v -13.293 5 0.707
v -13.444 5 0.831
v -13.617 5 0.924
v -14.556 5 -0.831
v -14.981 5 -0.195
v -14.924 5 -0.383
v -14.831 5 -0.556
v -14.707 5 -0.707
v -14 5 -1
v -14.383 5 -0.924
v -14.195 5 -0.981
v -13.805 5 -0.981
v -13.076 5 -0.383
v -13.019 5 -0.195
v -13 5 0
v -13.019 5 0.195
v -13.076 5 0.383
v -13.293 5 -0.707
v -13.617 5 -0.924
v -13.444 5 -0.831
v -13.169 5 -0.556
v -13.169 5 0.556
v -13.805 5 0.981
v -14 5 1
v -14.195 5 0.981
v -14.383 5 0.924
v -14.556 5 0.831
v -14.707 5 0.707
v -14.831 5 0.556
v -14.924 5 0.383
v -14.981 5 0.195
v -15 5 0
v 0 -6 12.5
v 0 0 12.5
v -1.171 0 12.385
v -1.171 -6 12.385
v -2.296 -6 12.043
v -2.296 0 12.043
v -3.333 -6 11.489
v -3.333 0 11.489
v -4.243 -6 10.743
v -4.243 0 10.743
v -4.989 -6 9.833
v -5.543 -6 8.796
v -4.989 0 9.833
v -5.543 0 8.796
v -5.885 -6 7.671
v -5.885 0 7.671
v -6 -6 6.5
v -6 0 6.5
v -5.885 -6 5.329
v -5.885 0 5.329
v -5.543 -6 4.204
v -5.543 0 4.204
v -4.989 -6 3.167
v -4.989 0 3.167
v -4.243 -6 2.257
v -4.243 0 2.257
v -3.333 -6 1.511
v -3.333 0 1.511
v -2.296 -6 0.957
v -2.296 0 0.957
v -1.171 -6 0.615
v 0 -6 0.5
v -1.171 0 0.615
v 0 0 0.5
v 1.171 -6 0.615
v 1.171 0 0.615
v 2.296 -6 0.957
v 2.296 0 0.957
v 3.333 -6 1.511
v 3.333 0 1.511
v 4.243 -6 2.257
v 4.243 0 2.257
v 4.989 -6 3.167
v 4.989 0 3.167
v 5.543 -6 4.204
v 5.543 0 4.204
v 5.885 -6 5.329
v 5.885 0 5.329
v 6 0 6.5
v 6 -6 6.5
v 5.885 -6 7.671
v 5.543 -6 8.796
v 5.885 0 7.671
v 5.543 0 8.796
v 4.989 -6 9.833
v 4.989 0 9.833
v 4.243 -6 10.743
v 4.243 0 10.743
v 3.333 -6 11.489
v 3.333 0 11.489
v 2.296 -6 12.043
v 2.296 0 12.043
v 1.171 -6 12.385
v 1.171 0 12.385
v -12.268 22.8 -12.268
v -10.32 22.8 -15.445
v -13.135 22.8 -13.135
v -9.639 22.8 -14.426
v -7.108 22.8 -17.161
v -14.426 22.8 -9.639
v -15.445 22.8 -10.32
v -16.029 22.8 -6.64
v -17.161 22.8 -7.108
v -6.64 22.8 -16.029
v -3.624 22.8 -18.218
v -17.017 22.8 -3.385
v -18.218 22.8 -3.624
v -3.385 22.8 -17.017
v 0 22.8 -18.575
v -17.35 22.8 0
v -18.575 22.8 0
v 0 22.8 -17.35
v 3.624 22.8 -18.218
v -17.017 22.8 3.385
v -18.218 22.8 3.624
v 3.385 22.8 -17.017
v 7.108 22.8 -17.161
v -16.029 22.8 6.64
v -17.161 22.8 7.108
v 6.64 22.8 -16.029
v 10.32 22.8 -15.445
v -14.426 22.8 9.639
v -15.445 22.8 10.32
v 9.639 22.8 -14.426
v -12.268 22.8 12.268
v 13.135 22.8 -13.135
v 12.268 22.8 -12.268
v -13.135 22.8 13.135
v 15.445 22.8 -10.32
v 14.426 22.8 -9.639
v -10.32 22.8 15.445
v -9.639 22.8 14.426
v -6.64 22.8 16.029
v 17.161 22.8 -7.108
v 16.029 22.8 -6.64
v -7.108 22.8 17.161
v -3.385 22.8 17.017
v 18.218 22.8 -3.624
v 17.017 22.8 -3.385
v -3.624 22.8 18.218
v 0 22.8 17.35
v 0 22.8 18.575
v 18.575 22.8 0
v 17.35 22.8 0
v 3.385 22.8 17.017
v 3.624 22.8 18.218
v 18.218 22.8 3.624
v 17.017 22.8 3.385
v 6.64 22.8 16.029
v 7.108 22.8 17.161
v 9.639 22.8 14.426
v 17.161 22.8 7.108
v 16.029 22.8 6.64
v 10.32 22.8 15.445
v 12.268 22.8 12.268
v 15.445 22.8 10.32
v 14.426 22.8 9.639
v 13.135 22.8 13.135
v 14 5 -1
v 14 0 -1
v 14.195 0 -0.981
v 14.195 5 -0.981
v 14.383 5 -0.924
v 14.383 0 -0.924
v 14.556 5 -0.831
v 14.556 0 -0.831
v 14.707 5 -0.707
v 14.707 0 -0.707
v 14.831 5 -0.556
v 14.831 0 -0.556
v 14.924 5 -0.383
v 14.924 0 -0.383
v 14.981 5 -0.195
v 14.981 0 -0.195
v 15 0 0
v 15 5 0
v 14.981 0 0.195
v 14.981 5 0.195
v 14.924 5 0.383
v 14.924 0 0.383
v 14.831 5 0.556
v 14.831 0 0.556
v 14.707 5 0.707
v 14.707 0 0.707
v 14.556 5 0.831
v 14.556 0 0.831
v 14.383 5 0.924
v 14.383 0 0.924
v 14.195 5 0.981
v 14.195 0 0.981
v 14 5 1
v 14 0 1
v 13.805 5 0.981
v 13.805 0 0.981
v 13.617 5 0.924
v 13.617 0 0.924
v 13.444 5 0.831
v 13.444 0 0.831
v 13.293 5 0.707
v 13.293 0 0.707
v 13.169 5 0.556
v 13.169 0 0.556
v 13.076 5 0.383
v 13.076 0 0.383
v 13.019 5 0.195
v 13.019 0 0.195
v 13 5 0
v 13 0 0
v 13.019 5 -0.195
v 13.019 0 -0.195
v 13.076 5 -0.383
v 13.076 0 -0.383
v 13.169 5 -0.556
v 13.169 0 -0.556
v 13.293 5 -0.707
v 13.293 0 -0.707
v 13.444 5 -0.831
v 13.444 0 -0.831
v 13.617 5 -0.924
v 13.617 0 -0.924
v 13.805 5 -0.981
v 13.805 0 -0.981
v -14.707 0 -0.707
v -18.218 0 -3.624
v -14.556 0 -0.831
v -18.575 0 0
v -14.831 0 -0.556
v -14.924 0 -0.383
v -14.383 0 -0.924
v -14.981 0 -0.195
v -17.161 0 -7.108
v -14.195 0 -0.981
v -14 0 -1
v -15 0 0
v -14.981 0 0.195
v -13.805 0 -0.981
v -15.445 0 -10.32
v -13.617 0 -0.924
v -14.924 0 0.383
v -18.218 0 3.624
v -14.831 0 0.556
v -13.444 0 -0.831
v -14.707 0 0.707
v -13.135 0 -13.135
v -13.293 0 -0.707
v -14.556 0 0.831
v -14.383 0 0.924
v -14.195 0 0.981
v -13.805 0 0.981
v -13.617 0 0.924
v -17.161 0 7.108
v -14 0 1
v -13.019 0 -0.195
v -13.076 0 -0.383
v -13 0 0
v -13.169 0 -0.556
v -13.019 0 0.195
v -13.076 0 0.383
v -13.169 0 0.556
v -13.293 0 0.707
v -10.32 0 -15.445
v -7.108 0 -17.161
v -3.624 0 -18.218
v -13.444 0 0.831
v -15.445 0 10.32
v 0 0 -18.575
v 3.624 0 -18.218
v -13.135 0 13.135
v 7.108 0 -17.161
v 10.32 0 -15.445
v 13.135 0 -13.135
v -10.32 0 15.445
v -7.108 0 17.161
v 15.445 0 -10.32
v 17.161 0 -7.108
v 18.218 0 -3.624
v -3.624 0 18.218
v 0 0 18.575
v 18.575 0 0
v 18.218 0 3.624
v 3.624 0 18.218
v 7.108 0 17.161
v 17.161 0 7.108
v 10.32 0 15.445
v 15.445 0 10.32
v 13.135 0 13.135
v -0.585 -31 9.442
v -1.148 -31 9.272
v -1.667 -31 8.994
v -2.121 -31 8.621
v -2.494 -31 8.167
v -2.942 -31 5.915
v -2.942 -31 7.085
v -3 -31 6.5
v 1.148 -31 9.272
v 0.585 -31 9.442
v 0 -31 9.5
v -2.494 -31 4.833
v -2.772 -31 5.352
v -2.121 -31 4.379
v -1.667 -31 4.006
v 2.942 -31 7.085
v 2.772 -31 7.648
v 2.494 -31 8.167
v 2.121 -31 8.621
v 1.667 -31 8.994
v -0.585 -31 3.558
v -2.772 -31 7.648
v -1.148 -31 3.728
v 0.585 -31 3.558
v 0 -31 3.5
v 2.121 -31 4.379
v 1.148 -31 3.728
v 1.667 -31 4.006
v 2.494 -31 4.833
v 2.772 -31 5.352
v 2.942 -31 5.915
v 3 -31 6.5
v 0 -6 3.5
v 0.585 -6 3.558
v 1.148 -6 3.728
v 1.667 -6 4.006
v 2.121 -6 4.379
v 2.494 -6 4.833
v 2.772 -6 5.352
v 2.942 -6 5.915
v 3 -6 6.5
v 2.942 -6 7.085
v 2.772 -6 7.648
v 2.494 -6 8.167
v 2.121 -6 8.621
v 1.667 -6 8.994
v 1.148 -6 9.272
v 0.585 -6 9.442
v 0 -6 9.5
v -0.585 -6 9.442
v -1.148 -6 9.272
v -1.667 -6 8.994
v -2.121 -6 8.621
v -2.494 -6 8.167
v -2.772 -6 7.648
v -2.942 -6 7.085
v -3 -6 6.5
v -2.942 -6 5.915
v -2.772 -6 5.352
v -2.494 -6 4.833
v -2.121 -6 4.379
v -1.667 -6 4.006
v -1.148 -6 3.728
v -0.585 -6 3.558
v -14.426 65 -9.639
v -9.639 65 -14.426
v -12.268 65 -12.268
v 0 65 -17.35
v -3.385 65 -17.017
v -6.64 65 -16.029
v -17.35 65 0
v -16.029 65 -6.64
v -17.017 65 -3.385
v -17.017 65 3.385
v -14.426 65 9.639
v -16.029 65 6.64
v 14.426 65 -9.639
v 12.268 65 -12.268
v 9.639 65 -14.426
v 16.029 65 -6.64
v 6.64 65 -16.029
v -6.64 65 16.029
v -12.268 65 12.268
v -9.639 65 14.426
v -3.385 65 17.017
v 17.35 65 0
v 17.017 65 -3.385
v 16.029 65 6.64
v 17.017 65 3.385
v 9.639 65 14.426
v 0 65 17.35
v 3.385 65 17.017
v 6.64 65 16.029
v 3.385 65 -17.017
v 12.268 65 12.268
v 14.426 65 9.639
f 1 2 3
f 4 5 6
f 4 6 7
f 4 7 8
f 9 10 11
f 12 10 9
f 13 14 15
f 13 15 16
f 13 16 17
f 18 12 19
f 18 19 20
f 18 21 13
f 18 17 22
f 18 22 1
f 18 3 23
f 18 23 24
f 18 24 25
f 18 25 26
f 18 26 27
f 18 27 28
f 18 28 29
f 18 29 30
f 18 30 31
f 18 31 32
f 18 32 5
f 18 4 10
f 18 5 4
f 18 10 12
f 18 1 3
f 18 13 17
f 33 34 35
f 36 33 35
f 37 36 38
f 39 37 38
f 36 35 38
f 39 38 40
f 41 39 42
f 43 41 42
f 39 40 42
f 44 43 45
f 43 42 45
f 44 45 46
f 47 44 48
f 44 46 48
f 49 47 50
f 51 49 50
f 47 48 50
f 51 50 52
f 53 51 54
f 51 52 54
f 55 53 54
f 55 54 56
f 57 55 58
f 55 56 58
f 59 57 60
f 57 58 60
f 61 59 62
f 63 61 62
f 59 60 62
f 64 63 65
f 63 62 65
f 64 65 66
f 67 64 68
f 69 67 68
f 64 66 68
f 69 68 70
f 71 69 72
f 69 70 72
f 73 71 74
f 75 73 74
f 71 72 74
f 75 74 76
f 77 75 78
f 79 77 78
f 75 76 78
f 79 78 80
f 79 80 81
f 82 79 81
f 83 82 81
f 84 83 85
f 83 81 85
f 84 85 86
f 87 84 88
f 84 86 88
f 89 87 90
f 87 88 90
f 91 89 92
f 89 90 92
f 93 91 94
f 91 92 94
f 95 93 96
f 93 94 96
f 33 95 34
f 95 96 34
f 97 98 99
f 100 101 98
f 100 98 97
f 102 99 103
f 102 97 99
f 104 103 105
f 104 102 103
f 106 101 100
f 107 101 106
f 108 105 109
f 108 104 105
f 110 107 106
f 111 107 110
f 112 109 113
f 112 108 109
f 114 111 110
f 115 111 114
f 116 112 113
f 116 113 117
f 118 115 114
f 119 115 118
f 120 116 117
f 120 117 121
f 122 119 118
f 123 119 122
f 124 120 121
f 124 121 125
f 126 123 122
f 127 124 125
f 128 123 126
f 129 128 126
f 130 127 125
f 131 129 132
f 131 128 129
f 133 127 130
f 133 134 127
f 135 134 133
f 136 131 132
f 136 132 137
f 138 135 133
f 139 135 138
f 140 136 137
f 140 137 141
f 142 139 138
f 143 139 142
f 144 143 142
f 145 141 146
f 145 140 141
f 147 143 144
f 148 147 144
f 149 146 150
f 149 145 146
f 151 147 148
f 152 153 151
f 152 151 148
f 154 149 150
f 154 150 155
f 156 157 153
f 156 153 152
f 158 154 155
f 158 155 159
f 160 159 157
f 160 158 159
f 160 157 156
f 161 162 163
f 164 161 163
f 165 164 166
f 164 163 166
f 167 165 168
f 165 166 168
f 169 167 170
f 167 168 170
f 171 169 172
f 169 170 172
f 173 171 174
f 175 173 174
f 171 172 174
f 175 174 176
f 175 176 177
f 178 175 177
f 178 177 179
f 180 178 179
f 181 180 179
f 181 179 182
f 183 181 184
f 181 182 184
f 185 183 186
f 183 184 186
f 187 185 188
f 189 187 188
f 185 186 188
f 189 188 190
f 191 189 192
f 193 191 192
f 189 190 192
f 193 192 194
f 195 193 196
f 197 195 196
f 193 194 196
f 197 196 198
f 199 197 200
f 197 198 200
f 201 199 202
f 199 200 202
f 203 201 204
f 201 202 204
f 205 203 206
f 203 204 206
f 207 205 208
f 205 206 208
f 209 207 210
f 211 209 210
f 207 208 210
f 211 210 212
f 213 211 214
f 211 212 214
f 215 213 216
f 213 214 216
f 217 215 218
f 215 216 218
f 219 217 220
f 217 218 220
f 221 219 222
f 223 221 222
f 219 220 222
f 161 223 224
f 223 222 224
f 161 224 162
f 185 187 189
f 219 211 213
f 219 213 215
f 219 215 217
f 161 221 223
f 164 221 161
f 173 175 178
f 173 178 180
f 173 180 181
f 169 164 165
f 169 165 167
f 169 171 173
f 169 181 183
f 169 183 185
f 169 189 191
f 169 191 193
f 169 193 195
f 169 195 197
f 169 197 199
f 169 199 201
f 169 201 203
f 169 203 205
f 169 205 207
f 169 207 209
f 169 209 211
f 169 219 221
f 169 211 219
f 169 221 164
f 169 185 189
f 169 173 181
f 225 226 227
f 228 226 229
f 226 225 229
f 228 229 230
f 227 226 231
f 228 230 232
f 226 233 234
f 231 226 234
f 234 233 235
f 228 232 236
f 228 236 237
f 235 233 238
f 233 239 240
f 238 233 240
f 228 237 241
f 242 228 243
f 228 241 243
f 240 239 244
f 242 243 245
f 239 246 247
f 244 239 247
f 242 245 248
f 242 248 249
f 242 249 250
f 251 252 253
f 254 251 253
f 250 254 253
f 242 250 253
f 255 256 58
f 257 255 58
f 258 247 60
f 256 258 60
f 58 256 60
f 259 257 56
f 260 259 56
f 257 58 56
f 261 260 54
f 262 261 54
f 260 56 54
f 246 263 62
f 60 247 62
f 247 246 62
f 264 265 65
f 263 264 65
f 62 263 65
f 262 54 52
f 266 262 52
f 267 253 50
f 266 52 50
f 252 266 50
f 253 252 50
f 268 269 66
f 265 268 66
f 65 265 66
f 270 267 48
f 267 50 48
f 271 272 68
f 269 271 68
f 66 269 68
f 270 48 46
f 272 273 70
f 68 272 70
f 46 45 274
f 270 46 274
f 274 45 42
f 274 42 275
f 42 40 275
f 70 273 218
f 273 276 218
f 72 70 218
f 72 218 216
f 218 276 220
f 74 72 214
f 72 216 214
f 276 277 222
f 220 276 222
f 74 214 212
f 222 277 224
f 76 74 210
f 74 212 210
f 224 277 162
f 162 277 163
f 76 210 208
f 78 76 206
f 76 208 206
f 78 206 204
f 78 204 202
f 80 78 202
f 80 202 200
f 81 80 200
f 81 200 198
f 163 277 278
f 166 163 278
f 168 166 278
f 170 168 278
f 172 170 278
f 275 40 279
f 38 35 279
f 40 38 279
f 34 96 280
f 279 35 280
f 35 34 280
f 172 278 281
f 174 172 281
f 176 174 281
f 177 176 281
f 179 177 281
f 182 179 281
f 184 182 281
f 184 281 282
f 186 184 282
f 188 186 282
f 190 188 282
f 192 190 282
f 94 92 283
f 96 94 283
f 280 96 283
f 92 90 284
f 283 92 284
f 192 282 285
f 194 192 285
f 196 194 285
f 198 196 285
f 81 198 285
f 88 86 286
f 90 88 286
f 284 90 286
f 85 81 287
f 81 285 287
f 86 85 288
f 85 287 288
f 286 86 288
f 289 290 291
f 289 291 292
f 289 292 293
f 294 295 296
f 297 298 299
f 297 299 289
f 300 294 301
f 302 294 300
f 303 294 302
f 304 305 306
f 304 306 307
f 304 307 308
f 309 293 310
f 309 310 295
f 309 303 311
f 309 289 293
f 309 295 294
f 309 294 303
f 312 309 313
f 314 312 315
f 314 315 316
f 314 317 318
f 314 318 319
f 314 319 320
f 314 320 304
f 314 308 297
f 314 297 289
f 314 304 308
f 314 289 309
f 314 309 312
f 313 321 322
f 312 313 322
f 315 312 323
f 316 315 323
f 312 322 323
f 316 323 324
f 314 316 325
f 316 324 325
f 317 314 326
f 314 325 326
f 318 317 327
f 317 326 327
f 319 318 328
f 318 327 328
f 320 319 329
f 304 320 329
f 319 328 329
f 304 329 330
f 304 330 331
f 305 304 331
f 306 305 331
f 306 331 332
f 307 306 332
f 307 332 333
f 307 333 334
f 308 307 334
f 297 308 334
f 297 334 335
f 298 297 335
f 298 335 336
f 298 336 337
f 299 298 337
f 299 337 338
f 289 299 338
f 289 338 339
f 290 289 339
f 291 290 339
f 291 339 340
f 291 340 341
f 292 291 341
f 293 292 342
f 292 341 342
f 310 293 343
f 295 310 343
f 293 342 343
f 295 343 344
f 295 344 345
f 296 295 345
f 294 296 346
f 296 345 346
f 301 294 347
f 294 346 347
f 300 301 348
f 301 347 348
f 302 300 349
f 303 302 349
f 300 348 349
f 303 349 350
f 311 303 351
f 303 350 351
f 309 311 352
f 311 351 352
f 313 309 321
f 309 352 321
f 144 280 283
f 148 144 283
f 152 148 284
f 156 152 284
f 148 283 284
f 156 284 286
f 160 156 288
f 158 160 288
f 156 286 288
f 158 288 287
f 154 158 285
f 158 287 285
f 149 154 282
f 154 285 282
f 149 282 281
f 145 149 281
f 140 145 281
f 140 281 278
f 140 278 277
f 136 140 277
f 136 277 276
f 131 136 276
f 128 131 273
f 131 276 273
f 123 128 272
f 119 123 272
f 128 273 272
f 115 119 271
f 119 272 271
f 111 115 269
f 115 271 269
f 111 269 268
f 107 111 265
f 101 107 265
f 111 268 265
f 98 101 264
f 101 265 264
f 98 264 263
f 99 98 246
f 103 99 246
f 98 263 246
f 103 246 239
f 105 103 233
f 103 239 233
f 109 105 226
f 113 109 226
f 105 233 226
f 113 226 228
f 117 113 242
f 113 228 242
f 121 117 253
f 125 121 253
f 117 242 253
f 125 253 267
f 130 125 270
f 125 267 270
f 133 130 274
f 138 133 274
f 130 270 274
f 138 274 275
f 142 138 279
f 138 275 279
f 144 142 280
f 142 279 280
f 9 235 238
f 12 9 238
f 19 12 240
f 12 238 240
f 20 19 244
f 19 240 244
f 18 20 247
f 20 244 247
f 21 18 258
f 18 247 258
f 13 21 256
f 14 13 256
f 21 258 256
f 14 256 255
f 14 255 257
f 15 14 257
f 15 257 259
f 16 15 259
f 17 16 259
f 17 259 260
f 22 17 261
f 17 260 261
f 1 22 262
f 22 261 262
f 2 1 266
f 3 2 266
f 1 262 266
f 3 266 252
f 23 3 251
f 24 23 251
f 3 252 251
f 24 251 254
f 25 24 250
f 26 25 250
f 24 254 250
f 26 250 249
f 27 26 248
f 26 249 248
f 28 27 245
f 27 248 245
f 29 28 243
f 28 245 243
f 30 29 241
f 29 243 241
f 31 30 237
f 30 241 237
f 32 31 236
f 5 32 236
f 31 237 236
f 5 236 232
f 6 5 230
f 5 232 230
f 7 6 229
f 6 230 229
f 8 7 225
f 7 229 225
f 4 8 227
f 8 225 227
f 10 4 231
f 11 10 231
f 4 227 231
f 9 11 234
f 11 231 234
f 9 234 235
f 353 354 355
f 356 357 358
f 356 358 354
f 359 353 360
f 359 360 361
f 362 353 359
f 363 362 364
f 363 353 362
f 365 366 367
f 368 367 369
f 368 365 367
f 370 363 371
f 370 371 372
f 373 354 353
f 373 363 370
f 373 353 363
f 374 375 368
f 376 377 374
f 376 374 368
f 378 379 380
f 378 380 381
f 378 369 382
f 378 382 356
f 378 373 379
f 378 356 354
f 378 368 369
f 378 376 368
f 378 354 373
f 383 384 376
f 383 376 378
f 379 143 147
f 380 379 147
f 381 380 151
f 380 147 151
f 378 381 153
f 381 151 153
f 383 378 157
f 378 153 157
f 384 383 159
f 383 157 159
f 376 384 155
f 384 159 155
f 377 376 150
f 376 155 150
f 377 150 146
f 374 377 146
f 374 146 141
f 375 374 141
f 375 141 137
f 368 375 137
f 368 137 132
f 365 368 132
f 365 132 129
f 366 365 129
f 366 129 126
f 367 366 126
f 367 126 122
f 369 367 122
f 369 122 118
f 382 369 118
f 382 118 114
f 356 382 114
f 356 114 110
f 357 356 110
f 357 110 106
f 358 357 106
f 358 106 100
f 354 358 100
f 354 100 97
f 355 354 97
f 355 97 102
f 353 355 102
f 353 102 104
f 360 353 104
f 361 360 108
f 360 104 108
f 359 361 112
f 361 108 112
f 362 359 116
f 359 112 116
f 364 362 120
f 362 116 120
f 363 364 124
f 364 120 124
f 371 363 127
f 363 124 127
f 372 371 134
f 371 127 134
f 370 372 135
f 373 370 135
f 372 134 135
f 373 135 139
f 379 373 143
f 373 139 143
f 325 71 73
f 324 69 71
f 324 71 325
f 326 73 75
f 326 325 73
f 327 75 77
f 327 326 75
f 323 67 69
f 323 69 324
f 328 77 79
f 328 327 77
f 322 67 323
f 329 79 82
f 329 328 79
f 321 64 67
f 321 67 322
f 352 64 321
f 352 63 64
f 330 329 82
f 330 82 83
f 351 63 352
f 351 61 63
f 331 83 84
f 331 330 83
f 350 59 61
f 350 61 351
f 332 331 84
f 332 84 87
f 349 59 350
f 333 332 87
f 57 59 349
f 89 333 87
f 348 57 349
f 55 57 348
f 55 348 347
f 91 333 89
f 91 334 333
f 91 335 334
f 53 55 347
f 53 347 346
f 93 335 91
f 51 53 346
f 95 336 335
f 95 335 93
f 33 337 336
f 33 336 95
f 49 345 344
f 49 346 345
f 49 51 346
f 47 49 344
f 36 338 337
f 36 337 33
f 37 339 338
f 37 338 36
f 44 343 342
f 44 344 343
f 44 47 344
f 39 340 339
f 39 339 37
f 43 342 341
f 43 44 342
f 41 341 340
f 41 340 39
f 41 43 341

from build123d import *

# Parameters (mm, degrees)
SKETCH_1_R            = 18.575
GEAR_BOX_DEPTH        = 22.8
SKETCH_1_3_R          = 17.35
MOTOR_DEPTH           = 65
SKETCH_2_R            = 6
SKETCH_2_R_2          = 3
CU_BEARING_DEPTH      = 6
SKETCH_2_3_R          = 3
F_6MMSHAFT_DEPTH      = 31
SKETCH_2_4_R          = 1
M2_TAPPING_HOLE_DEPTH = 5


with BuildPart() as part:
    # 草图1 → gear box (new body)
    with BuildSketch(Plane(origin=(0, 0, 0), x_dir=(1, 0, 0), z_dir=(0, 1, 0))):
        Circle(SKETCH_1_R)
    extrude(amount=GEAR_BOX_DEPTH)

    # 草图1<3> → motor (add)
    with BuildSketch(Plane(origin=(0, 0, 0), x_dir=(1, 0, 0), z_dir=(0, 1, 0))):
        Circle(SKETCH_1_3_R)
    extrude(amount=MOTOR_DEPTH)

    # 草图2 → Cu bearing (add)
    with BuildSketch(Plane.XZ):
        with Locations((0, 6.5)):
            Circle(SKETCH_2_R)
        with Locations((0, 6.5)):
            Circle(SKETCH_2_R_2, mode=Mode.SUBTRACT)
    extrude(amount=CU_BEARING_DEPTH)

    # 草图2<3> → 6mmshaft (add)
    with BuildSketch(Plane.XZ):
        with Locations((0, 6.5)):
            Circle(SKETCH_2_3_R)
    extrude(amount=F_6MMSHAFT_DEPTH)

    # 草图2<4> → M2 tapping hole (cut)
    with BuildSketch(Plane.XZ):
        with Locations((14, 0)):
            Circle(SKETCH_2_4_R)
        with Locations((-14, 0)):
            Circle(SKETCH_2_4_R)
    extrude(amount=-M2_TAPPING_HOLE_DEPTH, mode=Mode.SUBTRACT)


solid = part.part
